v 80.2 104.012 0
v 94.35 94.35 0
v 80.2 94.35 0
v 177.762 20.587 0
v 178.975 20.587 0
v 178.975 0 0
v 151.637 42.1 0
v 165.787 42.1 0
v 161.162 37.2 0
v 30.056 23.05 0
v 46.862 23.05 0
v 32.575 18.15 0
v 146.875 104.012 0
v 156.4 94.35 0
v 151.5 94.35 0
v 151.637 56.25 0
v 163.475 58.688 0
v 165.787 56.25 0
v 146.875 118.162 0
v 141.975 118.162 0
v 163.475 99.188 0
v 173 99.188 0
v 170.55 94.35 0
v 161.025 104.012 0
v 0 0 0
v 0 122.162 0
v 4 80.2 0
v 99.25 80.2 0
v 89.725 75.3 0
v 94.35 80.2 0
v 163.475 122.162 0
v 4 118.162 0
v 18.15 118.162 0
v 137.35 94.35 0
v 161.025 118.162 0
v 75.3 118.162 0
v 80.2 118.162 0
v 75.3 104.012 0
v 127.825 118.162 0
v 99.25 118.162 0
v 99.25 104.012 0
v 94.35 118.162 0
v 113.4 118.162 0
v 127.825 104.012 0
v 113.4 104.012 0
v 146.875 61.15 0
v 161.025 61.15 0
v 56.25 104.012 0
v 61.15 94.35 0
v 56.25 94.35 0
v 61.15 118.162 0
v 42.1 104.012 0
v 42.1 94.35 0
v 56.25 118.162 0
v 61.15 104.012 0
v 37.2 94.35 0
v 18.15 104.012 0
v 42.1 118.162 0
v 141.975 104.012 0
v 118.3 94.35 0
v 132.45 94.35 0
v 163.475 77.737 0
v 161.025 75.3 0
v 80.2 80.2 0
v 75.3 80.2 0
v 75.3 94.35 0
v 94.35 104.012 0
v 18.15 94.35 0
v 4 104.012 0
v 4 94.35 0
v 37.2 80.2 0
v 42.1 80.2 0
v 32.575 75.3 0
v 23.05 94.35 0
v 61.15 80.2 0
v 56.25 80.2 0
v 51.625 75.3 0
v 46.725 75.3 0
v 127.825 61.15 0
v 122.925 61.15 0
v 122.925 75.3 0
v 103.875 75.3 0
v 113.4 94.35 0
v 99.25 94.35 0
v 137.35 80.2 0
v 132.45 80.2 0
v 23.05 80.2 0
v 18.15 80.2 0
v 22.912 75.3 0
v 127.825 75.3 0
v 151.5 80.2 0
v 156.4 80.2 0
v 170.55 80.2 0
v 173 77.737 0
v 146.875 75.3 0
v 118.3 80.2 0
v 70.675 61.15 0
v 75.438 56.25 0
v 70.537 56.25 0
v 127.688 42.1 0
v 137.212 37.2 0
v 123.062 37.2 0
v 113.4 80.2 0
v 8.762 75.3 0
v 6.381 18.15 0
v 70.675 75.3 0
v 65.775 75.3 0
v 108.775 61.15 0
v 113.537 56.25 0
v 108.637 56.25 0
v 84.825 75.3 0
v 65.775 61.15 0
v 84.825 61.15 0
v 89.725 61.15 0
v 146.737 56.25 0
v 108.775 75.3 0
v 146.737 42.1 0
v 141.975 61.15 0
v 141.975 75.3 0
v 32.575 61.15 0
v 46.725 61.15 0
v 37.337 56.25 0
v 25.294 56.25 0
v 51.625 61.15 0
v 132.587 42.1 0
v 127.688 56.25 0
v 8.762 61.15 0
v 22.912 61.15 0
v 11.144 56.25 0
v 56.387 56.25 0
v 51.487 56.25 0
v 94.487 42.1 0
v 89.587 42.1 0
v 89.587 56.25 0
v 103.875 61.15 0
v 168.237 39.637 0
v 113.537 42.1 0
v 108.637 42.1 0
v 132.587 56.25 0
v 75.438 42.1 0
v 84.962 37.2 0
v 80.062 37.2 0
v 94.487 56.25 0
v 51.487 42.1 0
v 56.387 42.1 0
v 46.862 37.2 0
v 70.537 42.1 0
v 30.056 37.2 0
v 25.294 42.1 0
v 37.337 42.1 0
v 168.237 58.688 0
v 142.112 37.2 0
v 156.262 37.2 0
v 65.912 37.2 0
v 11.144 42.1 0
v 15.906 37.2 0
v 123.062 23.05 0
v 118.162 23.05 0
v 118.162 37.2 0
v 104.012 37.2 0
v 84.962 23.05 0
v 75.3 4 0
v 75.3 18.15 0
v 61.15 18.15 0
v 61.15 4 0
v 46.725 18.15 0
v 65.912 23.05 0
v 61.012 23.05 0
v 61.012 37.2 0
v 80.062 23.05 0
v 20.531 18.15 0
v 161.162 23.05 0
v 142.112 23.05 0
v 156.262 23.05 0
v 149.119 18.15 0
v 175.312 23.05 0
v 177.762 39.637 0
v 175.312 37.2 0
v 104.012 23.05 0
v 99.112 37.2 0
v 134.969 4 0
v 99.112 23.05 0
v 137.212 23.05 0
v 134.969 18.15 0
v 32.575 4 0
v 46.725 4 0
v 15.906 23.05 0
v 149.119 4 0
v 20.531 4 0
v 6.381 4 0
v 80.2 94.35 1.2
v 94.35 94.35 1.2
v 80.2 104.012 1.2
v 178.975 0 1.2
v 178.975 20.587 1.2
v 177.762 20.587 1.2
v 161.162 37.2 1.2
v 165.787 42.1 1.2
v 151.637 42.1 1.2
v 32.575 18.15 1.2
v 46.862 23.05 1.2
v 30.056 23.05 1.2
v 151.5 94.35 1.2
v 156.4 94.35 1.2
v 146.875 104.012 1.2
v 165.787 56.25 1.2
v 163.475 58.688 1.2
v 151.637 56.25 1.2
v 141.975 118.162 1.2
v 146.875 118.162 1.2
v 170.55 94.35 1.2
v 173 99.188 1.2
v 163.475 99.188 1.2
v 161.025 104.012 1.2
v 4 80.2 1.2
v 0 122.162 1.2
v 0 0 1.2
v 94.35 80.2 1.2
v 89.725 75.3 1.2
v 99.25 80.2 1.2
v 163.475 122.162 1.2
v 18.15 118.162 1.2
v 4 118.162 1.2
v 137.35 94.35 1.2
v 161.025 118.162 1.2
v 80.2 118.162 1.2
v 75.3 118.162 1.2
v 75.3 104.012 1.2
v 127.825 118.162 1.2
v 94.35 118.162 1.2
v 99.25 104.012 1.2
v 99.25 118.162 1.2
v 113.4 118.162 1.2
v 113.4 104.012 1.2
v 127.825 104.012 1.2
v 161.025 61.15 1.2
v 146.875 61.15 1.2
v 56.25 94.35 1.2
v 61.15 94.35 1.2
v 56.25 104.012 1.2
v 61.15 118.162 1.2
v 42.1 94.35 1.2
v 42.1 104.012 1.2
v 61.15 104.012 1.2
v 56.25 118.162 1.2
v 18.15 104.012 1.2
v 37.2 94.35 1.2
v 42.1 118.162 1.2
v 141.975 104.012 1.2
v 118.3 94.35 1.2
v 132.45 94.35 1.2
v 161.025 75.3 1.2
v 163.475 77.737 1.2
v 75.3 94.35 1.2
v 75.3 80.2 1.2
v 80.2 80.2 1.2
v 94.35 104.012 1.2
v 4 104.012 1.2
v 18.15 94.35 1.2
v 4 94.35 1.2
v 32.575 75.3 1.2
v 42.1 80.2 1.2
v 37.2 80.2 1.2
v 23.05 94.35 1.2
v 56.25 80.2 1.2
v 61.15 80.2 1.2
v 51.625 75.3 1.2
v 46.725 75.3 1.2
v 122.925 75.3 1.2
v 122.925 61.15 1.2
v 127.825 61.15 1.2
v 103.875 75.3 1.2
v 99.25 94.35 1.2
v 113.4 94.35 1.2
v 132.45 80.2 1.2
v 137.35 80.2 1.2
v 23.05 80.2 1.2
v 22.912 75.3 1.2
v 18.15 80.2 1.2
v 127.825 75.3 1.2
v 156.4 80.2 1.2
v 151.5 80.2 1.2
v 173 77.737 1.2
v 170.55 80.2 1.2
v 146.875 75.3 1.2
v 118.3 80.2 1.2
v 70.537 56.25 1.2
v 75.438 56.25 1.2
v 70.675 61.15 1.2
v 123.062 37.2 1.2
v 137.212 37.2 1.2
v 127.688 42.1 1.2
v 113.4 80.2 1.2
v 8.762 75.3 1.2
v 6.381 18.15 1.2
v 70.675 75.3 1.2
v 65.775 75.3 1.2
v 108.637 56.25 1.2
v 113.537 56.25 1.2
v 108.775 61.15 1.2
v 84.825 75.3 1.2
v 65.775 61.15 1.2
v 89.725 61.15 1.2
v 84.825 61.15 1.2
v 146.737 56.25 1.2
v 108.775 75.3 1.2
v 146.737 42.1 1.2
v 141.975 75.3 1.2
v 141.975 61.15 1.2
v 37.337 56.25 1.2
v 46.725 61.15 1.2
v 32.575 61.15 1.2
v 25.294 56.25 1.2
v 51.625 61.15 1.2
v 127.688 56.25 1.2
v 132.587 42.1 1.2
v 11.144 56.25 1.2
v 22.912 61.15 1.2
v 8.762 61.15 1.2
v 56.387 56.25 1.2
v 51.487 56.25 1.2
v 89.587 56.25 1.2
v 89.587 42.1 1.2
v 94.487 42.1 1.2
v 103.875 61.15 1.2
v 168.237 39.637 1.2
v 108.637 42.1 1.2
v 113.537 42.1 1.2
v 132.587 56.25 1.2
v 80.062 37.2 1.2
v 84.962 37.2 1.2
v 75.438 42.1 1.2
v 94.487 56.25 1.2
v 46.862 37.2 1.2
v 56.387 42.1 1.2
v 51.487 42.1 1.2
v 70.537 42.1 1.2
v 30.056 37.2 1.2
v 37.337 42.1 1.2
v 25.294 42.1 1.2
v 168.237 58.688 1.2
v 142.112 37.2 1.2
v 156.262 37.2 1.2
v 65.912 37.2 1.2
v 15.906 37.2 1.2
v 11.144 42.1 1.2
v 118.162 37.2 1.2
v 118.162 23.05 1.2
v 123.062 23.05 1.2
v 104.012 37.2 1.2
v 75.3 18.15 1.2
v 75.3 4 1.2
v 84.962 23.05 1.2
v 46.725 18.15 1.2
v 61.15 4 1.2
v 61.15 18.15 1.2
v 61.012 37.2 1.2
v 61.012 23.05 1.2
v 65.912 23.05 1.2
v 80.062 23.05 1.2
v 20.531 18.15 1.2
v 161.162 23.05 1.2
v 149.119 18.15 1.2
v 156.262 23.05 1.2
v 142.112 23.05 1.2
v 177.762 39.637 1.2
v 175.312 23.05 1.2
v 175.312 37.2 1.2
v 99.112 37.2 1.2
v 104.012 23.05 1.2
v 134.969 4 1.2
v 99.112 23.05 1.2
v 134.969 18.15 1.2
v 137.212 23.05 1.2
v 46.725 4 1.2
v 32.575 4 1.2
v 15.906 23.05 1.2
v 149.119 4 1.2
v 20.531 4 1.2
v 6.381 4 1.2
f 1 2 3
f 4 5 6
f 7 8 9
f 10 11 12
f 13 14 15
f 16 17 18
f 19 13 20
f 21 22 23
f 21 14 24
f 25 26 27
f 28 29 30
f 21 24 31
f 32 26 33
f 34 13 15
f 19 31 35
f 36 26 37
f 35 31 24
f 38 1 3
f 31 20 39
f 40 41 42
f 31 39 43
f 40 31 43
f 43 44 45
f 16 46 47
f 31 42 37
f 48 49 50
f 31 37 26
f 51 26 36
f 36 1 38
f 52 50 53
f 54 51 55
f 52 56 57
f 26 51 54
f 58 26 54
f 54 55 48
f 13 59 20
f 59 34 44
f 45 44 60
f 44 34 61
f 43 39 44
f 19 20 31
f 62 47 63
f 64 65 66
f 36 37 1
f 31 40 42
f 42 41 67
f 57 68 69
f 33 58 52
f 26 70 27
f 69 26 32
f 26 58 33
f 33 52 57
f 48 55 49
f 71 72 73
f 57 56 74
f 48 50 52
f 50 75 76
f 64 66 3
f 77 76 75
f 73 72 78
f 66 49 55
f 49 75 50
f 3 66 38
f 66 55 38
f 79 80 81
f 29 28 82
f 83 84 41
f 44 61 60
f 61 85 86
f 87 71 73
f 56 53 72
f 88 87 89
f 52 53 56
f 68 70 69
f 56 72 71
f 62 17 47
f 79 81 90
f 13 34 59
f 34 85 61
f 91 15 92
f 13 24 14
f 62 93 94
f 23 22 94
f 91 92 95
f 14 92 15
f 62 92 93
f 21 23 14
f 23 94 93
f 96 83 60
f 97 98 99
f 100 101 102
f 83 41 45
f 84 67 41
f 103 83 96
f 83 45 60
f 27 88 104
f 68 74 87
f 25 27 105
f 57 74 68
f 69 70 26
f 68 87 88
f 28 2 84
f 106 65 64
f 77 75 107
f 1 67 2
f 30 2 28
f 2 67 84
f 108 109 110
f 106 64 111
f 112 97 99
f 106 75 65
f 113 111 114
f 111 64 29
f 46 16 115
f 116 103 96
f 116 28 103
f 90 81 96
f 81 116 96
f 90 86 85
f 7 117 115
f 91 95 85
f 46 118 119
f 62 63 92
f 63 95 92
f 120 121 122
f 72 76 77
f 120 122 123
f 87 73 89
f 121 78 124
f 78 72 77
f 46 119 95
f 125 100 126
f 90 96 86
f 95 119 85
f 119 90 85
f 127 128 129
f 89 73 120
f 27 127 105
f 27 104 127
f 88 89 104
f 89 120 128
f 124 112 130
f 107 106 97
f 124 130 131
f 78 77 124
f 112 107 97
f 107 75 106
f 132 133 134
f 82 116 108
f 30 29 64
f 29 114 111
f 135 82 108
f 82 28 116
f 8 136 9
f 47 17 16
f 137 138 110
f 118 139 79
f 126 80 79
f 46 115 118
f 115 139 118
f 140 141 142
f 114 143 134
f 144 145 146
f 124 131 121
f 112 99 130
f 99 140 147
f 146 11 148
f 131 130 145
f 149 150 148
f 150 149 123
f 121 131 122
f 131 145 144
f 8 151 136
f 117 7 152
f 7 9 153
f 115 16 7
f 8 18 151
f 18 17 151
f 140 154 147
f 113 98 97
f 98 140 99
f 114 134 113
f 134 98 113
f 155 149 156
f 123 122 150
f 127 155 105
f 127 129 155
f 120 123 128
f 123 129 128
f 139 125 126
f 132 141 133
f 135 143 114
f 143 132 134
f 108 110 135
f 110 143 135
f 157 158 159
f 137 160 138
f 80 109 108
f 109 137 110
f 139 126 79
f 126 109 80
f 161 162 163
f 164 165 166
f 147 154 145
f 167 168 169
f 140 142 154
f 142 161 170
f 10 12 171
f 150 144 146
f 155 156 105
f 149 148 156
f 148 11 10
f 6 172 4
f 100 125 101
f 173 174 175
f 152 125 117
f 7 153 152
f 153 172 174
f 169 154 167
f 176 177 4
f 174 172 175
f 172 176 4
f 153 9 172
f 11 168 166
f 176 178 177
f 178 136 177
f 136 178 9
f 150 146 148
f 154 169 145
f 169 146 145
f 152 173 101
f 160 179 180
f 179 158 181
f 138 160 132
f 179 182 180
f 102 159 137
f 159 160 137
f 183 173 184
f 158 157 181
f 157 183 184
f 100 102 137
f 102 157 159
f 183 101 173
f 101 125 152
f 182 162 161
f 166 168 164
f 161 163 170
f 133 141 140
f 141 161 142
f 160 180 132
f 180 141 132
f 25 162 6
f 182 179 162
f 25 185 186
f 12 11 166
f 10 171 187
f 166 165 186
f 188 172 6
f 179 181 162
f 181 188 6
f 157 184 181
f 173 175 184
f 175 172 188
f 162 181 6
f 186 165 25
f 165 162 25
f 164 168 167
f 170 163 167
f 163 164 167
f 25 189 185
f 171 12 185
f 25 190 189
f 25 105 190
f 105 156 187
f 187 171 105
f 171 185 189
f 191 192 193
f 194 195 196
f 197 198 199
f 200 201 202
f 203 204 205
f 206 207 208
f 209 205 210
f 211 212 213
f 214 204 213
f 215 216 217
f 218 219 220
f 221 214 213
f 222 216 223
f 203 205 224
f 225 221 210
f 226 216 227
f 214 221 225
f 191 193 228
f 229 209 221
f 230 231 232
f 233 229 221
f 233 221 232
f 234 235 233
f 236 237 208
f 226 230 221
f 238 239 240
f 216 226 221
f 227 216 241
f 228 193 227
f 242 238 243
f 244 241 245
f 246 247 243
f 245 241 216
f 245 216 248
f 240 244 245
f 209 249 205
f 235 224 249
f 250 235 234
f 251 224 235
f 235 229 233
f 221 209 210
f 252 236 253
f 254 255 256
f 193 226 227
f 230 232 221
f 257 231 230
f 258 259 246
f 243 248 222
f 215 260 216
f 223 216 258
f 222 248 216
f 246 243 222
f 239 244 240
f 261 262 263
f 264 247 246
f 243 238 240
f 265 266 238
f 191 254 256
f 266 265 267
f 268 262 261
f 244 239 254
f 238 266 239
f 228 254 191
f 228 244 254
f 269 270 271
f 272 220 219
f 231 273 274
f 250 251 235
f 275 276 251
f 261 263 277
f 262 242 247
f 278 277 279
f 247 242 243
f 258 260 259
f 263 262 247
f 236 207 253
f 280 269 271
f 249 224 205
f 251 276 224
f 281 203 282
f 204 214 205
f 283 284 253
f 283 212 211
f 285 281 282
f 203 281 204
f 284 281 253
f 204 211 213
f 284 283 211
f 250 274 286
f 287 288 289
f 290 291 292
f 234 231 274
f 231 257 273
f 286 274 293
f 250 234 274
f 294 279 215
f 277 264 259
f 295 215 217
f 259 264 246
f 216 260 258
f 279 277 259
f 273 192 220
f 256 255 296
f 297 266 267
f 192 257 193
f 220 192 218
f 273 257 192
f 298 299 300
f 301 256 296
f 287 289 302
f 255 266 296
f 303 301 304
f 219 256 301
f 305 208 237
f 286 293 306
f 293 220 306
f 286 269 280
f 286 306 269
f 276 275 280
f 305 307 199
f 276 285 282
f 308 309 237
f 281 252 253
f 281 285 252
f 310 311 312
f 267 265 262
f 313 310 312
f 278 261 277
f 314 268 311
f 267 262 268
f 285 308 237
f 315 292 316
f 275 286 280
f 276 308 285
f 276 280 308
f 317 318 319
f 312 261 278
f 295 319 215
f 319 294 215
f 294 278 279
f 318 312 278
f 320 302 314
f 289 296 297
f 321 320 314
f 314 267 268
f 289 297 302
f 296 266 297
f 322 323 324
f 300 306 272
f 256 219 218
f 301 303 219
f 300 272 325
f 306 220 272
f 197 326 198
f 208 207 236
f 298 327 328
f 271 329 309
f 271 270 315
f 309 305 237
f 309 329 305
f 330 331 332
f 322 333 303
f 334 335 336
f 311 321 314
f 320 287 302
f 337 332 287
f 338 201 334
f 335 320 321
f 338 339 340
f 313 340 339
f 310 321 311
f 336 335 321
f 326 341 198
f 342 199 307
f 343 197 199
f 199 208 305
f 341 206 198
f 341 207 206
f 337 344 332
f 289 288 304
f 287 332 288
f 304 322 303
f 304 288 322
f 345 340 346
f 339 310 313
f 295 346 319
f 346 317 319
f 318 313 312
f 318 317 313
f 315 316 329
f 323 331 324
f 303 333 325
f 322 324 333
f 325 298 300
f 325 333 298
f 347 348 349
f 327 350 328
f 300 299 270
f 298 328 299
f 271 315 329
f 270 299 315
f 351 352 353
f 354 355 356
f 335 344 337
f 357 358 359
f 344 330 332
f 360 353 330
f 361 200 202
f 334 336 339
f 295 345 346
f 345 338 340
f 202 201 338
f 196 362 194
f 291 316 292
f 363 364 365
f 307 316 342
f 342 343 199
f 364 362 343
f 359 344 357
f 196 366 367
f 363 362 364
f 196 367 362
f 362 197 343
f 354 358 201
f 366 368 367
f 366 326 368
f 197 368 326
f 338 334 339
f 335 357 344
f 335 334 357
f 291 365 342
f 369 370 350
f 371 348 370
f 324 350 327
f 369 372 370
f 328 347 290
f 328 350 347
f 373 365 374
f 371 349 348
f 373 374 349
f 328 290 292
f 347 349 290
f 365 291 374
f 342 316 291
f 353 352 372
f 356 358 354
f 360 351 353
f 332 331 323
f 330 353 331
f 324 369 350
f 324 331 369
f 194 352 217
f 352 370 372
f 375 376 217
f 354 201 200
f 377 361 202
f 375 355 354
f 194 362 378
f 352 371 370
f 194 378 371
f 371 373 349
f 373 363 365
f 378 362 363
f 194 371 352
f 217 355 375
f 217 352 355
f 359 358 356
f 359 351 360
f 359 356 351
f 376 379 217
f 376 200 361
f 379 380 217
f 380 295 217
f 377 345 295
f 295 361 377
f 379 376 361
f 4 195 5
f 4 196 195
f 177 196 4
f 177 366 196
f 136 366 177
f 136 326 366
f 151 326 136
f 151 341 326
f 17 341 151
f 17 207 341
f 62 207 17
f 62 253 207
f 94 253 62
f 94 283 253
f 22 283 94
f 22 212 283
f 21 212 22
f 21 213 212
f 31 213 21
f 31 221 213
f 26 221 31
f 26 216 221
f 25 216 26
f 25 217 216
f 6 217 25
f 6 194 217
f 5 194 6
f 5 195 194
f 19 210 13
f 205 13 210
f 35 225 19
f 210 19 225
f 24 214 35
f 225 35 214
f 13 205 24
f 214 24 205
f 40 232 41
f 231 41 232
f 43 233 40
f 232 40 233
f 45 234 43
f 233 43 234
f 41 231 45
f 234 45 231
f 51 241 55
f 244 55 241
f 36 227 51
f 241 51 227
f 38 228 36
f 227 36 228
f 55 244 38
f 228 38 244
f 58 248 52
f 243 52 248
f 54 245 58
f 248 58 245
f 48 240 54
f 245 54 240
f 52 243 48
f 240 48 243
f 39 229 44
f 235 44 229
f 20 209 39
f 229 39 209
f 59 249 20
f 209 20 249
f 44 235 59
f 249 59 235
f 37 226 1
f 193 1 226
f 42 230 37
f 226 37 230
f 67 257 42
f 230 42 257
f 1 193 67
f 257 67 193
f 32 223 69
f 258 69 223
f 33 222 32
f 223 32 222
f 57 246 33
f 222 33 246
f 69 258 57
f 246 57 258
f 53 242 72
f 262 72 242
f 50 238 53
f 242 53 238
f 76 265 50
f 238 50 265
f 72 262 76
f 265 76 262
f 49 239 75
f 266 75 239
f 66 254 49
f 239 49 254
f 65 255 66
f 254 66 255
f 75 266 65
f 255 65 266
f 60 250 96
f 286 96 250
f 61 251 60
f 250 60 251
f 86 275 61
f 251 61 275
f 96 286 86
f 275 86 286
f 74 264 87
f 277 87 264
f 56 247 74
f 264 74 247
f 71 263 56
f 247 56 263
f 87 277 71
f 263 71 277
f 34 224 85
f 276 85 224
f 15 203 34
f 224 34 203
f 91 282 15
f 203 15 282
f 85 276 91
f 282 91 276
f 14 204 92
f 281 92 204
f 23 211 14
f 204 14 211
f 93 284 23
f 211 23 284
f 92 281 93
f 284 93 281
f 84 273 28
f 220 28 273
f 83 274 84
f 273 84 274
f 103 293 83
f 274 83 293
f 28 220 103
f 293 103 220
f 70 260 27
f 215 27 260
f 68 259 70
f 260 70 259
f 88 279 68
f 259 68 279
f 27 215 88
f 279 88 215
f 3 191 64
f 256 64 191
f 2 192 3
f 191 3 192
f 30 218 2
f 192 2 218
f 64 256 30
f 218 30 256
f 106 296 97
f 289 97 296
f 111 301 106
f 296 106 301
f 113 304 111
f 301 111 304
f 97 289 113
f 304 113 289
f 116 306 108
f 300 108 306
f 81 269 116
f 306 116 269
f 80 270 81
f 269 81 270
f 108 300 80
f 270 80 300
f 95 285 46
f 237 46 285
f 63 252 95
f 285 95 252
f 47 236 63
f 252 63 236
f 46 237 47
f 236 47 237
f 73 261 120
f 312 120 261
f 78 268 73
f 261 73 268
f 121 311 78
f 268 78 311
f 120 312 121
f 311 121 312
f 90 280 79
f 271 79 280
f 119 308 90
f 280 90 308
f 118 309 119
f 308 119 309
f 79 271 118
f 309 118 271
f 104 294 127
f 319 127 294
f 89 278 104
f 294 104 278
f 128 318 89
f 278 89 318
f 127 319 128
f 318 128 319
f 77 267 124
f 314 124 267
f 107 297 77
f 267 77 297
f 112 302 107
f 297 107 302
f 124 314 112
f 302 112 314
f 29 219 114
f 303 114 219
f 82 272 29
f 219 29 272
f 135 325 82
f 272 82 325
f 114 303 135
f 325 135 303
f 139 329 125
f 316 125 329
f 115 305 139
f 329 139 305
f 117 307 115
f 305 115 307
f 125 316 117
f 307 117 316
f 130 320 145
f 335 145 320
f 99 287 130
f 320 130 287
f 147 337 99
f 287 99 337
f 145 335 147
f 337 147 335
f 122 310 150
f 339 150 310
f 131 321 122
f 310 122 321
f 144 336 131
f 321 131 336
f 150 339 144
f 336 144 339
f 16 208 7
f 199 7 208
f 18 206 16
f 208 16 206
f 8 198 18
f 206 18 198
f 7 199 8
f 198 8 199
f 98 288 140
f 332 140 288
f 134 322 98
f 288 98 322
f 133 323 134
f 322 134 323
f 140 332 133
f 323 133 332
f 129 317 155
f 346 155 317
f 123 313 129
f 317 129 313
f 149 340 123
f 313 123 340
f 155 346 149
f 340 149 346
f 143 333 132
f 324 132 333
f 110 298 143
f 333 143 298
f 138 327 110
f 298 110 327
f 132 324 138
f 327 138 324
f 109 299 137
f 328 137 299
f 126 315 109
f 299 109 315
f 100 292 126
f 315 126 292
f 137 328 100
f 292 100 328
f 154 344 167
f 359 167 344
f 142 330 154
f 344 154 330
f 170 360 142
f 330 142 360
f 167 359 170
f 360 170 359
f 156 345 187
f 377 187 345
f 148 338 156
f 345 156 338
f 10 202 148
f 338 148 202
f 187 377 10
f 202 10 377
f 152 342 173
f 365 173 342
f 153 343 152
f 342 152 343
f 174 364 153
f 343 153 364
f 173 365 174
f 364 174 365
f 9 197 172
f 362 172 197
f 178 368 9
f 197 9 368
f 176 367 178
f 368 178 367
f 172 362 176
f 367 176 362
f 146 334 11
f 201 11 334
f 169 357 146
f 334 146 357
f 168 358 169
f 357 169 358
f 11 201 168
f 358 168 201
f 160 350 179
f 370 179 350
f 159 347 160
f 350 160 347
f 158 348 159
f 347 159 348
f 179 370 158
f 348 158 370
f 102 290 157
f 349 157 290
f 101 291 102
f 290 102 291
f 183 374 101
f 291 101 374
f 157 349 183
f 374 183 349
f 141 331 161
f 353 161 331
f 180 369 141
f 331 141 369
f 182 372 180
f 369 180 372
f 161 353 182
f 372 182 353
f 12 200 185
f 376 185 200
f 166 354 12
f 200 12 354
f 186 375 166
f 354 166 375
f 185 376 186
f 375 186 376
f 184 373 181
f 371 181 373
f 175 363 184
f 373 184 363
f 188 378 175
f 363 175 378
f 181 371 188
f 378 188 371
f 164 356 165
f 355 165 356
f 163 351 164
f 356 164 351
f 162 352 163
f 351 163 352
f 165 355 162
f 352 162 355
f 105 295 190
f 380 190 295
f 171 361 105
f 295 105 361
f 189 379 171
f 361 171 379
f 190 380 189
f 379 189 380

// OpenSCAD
// Printed plate halves. Holes are 14.15 mm so a 0.4 mm nozzle
// still clips a Kailh Choc V2. Laser-cut the DXF instead if you can:
// that file uses the true 13.95 mm opening.
plate_t = 1.2;
part = is_undef(part) ? "left" : part;

module holes() {
    translate([261.1063,30.1250]) square([14.15,14.15], center=true);
    translate([39.6500,68.2250]) square([14.15,14.15], center=true);
    translate([68.2250,111.0875]) square([14.15,14.15], center=true);
    translate([106.3250,111.0875]) square([14.15,14.15], center=true);
    translate([339.6875,87.2750]) square([14.15,14.15], center=true);
    translate([15.8375,68.2250]) square([14.15,14.15], center=true);
    translate([211.1000,68.2250]) square([14.15,14.15], center=true);
    translate([158.7125,49.1750]) square([14.15,14.15], center=true);
    translate([220.6250,87.2750]) square([14.15,14.15], center=true);
    translate([49.1750,87.2750]) square([14.15,14.15], center=true);
    translate([68.2250,87.2750]) square([14.15,14.15], center=true);
    translate([182.5250,87.2750]) square([14.15,14.15], center=true);
    translate([173.0000,111.0875]) square([14.15,14.15], center=true);
    translate([277.7750,111.0875]) square([14.15,14.15], center=true);
    translate([125.3750,87.2750]) square([14.15,14.15], center=true);
    translate([173.0000,68.2250]) square([14.15,14.15], center=true);
    translate([249.2000,68.2250]) square([14.15,14.15], center=true);
    translate([206.3375,30.1250]) square([14.15,14.15], center=true);
    translate([153.9500,68.2250]) square([14.15,14.15], center=true);
    translate([44.4125,49.1750]) square([14.15,14.15], center=true);
    translate([320.6375,30.1250]) square([14.15,14.15], center=true);
    translate([82.5125,49.1750]) square([14.15,14.15], center=true);
    translate([130.1375,30.1250]) square([14.15,14.15], center=true);
    translate([268.2500,87.2750]) square([14.15,14.15], center=true);
    translate([13.4563,11.0750]) square([14.15,14.15], center=true);
    translate([115.8500,68.2250]) square([14.15,14.15], center=true);
    translate([139.6625,49.1750]) square([14.15,14.15], center=true);
    translate([120.6125,49.1750]) square([14.15,14.15], center=true);
    translate([101.5625,49.1750]) square([14.15,14.15], center=true);
    translate([339.6875,68.2250]) square([14.15,14.15], center=true);
    translate([87.2750,87.2750]) square([14.15,14.15], center=true);
    translate([77.7500,68.2250]) square([14.15,14.15], center=true);
    translate([225.3875,30.1250]) square([14.15,14.15], center=true);
    translate([187.2875,30.1250]) square([14.15,14.15], center=true);
    translate([87.2750,111.0875]) square([14.15,14.15], center=true);
    translate([339.6875,111.0875]) square([14.15,14.15], center=true);
    translate([11.0750,87.2750]) square([14.15,14.15], center=true);
    translate([106.3250,87.2750]) square([14.15,14.15], center=true);
    translate([320.6375,87.2750]) square([14.15,14.15], center=true);
    translate([163.4750,87.2750]) square([14.15,14.15], center=true);
    translate([111.0875,30.1250]) square([14.15,14.15], center=true);
    translate([63.4625,49.1750]) square([14.15,14.15], center=true);
    translate([339.6875,11.0750]) square([14.15,14.15], center=true);
    translate([320.6375,11.0750]) square([14.15,14.15], center=true);
    translate([68.2250,11.0750]) square([14.15,14.15], center=true);
    translate([320.6375,68.2250]) square([14.15,14.15], center=true);
    translate([92.0375,30.1250]) square([14.15,14.15], center=true);
    translate([192.0500,111.0875]) square([14.15,14.15], center=true);
    translate([142.0437,11.0750]) square([14.15,14.15], center=true);
    translate([134.9000,111.0875]) square([14.15,14.15], center=true);
    translate([39.6500,11.0750]) square([14.15,14.15], center=true);
    translate([320.6375,111.0875]) square([14.15,14.15], center=true);
    translate([168.2375,30.1250]) square([14.15,14.15], center=true);
    translate([49.1750,111.0875]) square([14.15,14.15], center=true);
    translate([230.1500,68.2250]) square([14.15,14.15], center=true);
    translate([58.7000,68.2250]) square([14.15,14.15], center=true);
    translate([234.9125,49.1750]) square([14.15,14.15], center=true);
    translate([215.8625,11.0750]) square([14.15,14.15], center=true);
    translate([258.7250,111.0875]) square([14.15,14.15], center=true);
    translate([149.1875,30.1250]) square([14.15,14.15], center=true);
    translate([273.0125,11.0750]) square([14.15,14.15], center=true);
    translate([22.9812,30.1250]) square([14.15,14.15], center=true);
    translate([53.9375,30.1250]) square([14.15,14.15], center=true);
    translate([273.0125,68.2250]) square([14.15,14.15], center=true);
    translate([153.9500,111.0875]) square([14.15,14.15], center=true);
    translate([239.6750,111.0875]) square([14.15,14.15], center=true);
    translate([301.5875,11.0750]) square([14.15,14.15], center=true);
    translate([96.8000,68.2250]) square([14.15,14.15], center=true);
    translate([18.2187,49.1750]) square([14.15,14.15], center=true);
    translate([134.9000,68.2250]) square([14.15,14.15], center=true);
    translate([301.5875,87.2750]) square([14.15,14.15], center=true);
    translate([244.4375,11.0750]) square([14.15,14.15], center=true);
    translate([196.8125,49.1750]) square([14.15,14.15], center=true);
    translate([301.5875,68.2250]) square([14.15,14.15], center=true);
    translate([192.0500,68.2250]) square([14.15,14.15], center=true);
    translate([30.1250,87.2750]) square([14.15,14.15], center=true);
    translate([177.7625,49.1750]) square([14.15,14.15], center=true);
    translate([220.6250,111.0875]) square([14.15,14.15], center=true);
    translate([301.5875,111.0875]) square([14.15,14.15], center=true);
    translate([144.4250,87.2750]) square([14.15,14.15], center=true);
    translate([239.6750,87.2750]) square([14.15,14.15], center=true);
    translate([201.5750,87.2750]) square([14.15,14.15], center=true);
    translate([265.8688,49.1750]) square([14.15,14.15], center=true);
    translate([11.0750,111.0875]) square([14.15,14.15], center=true);
    translate([215.8625,49.1750]) square([14.15,14.15], center=true);
    translate([72.9875,30.1250]) square([14.15,14.15], center=true);
}

module half(outline) {
  linear_extrude(plate_t)
    difference() {
      polygon(outline);
      holes();
    }
}

if (part == "left") half([[0.0000,0.0000],[178.9750,0.0000],[178.9750,3.0875],[178.9750,19.0875],[178.9750,20.5875],[177.7625,20.5875],[177.7625,22.0875],[177.7625,38.0875],[177.7625,39.6375],[168.2375,39.6375],[168.2375,41.1875],[168.2375,57.1875],[168.2375,58.6875],[163.4750,58.6875],[163.4750,60.1875],[163.4750,76.1875],[163.4750,77.7375],[173.0000,77.7375],[173.0000,79.2875],[173.0000,95.2875],[173.0000,99.1875],[163.4750,99.1875],[163.4750,103.0875],[163.4750,119.0875],[163.4750,122.1625],[0.0000,122.1625]]);
if (part == "right") half([[350.7625,122.1625],[163.4750,122.1625],[163.4750,119.0875],[163.4750,103.0875],[163.4750,99.1875],[173.0000,99.1875],[173.0000,95.2875],[173.0000,79.2875],[173.0000,77.7375],[163.4750,77.7375],[163.4750,76.1875],[163.4750,60.1875],[163.4750,58.6875],[168.2375,58.6875],[168.2375,57.1875],[168.2375,41.1875],[168.2375,39.6375],[177.7625,39.6375],[177.7625,38.0875],[177.7625,22.0875],[177.7625,20.5875],[178.9750,20.5875],[178.9750,19.0875],[178.9750,3.0875],[178.9750,0.0000],[350.7625,0.0000]]);
